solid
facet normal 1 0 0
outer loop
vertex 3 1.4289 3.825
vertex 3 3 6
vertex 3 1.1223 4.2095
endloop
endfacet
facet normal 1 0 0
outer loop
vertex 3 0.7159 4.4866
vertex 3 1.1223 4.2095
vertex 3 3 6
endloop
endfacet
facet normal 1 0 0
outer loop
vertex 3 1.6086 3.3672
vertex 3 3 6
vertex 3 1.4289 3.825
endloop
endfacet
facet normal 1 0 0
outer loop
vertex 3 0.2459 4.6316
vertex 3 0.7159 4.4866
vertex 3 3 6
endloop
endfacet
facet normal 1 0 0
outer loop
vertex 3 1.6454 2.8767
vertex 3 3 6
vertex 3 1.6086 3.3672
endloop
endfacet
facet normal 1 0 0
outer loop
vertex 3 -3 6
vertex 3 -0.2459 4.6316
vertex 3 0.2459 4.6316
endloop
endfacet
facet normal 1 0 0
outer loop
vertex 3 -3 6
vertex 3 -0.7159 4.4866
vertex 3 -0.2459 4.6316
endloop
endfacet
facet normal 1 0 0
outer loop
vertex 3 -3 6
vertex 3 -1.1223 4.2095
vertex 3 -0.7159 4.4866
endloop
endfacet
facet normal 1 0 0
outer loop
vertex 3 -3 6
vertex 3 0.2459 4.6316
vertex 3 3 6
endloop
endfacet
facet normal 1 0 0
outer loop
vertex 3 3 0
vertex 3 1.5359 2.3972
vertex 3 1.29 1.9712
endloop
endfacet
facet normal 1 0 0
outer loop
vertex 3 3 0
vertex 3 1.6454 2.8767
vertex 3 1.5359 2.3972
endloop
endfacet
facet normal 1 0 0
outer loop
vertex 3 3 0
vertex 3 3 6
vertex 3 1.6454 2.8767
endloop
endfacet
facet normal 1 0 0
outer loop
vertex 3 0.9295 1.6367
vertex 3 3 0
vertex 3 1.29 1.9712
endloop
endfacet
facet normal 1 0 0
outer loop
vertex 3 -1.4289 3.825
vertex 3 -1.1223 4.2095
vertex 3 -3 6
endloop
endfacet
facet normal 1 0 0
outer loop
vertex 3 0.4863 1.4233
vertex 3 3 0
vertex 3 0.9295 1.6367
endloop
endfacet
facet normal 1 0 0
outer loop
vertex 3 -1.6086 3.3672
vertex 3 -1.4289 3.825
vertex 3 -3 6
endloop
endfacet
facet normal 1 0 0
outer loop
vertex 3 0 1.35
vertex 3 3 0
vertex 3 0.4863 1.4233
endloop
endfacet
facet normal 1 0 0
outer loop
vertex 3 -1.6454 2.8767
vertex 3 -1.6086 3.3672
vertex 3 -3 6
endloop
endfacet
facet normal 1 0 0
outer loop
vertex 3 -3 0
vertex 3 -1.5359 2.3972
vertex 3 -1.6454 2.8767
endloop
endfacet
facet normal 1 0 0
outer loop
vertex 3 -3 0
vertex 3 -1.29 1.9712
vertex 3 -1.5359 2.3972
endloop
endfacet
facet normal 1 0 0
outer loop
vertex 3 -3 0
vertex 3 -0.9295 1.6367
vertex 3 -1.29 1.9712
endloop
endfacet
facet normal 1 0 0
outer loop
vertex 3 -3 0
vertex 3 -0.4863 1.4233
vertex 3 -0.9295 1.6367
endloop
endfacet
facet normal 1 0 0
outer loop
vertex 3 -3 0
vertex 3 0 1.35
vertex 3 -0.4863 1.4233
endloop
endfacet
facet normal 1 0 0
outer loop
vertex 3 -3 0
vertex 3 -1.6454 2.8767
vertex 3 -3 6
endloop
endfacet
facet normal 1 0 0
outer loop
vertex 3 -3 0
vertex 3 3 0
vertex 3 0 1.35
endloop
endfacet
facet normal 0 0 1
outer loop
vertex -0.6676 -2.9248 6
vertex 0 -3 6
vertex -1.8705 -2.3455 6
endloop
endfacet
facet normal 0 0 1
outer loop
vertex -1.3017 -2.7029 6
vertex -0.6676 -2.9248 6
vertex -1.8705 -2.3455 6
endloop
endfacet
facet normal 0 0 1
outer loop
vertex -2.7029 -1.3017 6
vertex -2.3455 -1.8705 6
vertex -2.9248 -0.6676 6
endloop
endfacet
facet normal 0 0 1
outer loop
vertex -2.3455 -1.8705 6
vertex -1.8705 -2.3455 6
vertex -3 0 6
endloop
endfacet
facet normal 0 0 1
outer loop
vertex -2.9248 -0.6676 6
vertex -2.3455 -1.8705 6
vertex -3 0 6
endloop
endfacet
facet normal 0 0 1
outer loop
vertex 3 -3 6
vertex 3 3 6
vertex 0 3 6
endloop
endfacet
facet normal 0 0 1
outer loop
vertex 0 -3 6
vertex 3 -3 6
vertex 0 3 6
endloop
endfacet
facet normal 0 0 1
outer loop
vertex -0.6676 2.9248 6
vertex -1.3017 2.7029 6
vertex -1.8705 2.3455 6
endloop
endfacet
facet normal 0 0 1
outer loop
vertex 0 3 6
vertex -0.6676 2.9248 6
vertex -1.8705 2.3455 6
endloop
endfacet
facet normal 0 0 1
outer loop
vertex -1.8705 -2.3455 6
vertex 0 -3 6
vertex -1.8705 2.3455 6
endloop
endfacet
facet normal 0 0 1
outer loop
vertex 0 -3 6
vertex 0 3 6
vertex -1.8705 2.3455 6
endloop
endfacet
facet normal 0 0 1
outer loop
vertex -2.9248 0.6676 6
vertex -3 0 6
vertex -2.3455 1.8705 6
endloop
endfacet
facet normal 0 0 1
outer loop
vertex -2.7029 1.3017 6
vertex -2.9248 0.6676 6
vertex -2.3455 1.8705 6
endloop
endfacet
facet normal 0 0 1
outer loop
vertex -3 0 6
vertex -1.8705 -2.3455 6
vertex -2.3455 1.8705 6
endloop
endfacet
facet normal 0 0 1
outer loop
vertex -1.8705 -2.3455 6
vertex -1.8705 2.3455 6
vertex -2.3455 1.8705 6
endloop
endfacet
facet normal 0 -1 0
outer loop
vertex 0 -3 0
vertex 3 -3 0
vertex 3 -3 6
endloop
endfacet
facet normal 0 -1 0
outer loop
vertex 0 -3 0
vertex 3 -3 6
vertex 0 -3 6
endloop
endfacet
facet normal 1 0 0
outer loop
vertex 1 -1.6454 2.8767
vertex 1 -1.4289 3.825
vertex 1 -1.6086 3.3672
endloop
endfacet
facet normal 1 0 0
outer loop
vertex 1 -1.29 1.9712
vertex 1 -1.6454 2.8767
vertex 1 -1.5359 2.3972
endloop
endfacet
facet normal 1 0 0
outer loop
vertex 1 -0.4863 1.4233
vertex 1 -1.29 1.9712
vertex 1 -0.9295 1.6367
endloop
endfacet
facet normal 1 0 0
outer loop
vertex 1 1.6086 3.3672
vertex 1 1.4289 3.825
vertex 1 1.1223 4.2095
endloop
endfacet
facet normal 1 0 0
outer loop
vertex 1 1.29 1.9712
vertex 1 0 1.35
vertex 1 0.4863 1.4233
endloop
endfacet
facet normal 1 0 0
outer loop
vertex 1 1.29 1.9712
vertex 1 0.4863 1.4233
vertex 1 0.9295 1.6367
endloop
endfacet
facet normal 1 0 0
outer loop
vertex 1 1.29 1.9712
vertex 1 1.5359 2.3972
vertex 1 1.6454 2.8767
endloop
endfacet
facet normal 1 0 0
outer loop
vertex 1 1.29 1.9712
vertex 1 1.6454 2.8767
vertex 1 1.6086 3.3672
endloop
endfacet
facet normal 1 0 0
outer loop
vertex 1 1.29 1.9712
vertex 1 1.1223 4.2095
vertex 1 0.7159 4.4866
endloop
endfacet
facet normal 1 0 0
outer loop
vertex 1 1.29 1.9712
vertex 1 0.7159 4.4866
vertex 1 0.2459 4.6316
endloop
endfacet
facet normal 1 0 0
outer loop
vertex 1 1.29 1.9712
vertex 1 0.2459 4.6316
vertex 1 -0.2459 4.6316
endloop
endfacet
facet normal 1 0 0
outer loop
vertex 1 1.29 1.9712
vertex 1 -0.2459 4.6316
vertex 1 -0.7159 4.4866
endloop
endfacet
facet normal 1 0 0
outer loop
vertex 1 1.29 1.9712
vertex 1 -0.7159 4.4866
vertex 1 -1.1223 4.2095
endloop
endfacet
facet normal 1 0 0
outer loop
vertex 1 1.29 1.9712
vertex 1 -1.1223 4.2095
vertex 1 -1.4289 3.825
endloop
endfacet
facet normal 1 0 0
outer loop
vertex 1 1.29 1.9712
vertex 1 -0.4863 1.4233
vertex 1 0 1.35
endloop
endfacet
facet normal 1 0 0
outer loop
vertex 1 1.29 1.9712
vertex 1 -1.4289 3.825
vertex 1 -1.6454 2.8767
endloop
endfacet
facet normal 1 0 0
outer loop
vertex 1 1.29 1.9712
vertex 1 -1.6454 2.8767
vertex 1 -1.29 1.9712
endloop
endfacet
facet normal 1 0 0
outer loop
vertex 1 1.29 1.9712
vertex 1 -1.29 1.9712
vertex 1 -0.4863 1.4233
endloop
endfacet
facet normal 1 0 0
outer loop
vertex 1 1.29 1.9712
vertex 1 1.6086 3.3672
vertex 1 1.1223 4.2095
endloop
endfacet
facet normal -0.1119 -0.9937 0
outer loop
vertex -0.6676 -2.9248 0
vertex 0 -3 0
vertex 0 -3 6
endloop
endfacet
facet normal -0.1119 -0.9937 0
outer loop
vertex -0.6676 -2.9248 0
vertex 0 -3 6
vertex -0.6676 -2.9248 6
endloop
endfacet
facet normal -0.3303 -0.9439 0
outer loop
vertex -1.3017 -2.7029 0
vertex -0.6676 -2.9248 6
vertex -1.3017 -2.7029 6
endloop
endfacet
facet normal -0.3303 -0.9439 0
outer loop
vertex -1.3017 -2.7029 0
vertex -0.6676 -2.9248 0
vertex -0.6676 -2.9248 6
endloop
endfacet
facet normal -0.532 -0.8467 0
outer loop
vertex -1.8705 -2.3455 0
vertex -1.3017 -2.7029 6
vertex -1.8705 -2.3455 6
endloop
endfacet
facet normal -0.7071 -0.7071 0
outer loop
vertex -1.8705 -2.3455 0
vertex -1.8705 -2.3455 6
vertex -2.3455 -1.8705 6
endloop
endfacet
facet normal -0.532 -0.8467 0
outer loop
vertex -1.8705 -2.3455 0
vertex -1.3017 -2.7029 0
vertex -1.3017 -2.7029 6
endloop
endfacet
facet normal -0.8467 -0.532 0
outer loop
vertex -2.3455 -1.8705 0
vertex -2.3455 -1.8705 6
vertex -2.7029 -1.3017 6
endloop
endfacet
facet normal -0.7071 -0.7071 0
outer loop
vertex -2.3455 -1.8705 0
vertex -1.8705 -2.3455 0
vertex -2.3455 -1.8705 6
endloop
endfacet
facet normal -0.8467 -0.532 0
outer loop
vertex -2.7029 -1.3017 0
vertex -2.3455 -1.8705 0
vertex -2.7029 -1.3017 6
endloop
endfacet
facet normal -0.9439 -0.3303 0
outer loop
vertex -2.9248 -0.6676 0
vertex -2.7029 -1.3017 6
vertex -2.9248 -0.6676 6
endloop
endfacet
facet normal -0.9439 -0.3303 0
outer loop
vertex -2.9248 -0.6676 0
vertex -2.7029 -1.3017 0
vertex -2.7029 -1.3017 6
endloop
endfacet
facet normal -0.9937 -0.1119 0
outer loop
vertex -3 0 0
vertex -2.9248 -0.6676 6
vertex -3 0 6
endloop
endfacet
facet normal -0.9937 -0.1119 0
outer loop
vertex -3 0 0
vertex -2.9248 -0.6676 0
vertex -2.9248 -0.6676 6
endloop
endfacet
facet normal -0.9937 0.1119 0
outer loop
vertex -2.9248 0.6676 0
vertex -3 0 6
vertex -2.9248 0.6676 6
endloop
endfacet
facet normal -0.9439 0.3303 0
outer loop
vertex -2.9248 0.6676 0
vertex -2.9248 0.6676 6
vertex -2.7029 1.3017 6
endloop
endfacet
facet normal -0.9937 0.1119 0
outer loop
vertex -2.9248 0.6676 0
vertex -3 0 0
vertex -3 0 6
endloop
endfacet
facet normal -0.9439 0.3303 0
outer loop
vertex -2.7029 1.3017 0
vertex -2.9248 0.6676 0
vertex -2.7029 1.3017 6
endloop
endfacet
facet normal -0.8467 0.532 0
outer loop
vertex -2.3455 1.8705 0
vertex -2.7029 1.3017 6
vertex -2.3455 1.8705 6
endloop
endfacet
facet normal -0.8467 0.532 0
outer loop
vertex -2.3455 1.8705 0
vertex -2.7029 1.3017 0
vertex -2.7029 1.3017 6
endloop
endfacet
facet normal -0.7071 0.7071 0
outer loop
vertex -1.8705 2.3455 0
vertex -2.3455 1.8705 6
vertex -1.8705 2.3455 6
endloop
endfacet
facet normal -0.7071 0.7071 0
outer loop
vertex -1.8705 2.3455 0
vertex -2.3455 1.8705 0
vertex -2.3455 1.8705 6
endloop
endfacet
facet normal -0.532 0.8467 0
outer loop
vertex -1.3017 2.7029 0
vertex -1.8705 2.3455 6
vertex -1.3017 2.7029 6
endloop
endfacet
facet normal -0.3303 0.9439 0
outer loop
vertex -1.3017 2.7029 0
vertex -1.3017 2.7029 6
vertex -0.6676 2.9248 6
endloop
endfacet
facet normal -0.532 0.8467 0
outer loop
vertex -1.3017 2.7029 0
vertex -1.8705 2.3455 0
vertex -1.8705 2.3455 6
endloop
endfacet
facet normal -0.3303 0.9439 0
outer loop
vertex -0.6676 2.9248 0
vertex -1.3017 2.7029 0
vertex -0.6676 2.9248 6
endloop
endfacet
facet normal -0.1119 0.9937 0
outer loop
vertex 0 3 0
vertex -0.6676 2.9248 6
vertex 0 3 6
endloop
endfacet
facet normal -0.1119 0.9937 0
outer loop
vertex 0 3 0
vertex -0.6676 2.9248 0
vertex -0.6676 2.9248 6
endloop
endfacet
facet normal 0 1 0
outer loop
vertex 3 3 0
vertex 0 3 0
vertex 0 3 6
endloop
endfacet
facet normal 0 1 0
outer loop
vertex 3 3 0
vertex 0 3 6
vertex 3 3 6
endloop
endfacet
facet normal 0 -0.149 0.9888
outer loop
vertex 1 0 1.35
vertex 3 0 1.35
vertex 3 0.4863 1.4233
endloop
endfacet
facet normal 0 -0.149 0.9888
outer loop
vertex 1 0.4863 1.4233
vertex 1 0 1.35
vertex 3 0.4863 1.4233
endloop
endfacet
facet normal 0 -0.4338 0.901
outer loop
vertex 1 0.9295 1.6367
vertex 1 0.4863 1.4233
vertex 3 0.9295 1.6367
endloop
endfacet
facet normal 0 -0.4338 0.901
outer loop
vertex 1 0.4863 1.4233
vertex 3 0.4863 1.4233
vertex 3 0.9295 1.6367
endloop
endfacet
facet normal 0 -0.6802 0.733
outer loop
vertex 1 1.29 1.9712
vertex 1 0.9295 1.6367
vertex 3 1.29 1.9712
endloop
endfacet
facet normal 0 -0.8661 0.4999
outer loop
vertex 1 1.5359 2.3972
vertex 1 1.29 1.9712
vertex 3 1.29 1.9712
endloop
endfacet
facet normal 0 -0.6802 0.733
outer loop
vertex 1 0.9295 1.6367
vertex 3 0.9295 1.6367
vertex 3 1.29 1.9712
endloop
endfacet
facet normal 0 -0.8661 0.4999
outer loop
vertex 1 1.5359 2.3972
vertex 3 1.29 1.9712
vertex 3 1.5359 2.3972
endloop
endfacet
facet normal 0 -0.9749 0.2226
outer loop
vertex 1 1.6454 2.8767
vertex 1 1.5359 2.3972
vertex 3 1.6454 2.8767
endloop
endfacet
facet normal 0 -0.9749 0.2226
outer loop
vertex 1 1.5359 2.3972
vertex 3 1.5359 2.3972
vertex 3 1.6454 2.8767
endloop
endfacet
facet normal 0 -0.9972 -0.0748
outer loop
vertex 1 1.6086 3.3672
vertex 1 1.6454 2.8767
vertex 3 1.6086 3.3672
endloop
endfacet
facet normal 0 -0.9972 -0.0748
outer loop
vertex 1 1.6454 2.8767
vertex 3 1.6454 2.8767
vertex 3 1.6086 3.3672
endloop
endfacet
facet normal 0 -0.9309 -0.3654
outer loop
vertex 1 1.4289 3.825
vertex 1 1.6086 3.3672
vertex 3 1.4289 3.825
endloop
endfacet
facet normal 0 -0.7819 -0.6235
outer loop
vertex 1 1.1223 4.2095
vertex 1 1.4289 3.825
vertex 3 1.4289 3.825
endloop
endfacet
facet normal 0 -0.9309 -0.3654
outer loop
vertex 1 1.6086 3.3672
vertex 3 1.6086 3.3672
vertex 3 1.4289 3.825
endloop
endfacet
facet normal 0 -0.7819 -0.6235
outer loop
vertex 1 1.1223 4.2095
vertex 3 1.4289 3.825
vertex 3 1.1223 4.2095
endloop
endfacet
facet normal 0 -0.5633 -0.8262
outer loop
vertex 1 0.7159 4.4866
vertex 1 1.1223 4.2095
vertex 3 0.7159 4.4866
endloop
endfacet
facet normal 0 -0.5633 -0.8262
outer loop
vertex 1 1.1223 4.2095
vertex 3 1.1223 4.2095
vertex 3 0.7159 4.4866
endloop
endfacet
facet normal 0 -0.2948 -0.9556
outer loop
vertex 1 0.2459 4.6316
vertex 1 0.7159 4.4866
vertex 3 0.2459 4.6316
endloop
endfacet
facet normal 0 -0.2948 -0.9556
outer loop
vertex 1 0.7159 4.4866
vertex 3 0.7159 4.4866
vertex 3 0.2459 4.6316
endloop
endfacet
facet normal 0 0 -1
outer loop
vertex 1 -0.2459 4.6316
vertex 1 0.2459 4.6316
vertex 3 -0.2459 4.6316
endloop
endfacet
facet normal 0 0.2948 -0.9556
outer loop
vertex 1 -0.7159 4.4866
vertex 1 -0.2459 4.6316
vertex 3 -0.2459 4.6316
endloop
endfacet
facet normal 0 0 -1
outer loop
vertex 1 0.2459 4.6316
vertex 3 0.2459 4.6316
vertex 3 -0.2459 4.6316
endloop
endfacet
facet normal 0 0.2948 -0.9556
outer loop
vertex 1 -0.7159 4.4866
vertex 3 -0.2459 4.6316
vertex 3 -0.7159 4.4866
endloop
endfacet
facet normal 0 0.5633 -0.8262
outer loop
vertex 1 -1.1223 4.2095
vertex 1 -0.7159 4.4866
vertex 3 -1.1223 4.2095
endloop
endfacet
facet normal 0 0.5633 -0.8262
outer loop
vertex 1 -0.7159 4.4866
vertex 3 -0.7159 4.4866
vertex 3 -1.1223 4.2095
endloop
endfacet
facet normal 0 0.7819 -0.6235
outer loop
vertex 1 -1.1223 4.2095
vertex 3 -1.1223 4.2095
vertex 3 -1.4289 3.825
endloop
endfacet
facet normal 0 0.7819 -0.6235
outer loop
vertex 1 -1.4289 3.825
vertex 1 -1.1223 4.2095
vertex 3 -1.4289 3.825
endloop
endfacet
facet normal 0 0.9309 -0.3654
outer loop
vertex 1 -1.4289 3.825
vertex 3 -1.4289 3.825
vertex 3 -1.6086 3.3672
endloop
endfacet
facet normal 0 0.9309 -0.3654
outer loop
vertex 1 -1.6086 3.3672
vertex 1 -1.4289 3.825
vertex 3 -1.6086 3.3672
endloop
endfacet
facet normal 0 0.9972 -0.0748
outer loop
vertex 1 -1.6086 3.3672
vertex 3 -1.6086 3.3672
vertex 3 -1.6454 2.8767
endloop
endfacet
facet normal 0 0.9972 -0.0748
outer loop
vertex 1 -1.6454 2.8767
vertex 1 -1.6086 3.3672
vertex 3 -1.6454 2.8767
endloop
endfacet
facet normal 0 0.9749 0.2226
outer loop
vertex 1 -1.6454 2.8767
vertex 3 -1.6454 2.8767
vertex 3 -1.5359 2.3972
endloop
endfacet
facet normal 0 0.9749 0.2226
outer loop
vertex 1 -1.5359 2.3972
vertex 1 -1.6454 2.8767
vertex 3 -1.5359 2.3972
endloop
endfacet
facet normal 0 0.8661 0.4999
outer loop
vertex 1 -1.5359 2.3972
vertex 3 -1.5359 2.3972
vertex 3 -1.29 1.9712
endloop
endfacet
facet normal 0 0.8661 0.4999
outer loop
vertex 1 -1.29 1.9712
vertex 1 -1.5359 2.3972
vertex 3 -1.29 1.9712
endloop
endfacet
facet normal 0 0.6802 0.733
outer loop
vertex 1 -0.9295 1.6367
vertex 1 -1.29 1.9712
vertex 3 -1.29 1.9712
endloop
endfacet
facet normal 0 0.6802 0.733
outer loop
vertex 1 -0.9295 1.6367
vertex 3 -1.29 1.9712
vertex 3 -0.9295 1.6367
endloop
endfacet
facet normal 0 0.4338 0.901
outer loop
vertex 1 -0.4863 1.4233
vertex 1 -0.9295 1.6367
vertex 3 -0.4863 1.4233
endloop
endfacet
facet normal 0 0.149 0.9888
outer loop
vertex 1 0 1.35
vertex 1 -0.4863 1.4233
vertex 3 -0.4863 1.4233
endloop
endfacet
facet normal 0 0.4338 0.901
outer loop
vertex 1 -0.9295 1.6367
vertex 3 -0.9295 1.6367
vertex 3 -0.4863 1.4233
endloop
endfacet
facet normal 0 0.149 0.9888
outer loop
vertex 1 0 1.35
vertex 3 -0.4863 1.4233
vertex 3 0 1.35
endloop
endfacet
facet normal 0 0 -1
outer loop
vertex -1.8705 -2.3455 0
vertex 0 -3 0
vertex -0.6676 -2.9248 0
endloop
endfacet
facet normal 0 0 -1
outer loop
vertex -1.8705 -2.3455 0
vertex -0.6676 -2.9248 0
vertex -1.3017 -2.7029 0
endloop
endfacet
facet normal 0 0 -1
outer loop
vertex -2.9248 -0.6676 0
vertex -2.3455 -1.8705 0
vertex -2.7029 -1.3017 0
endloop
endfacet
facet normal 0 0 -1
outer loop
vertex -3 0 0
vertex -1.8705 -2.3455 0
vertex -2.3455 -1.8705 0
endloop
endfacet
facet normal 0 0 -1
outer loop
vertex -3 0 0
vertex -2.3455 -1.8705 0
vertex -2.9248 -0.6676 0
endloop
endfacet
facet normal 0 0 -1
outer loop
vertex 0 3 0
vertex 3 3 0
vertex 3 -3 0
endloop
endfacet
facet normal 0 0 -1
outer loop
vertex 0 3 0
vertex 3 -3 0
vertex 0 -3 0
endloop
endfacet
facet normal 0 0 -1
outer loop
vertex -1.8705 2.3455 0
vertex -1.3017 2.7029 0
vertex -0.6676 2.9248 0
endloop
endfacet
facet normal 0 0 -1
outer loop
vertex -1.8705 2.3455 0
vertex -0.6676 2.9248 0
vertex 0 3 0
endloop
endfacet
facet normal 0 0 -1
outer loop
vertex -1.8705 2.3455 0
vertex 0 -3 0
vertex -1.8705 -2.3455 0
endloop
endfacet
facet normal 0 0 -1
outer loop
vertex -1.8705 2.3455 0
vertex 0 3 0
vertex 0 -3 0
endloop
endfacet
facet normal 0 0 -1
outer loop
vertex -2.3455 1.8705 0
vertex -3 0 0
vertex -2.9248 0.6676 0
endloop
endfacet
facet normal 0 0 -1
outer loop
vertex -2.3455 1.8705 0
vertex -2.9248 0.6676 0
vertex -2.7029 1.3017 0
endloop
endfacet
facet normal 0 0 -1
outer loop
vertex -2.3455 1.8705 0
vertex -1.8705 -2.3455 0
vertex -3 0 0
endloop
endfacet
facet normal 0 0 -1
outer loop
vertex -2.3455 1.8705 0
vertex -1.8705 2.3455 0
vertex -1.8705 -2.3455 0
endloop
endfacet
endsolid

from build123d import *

# Parameters (mm, degrees)
RESSALTO_EXTRUS_O1_DEPTH = 6
ESBO_O3_R                = 1.65
CORTE_EXTRUS_O1_DEPTH    = 2


with BuildPart() as part:
    # Esboço1 → Ressalto-extrusão1 (new body)
    with BuildSketch(Plane.XY):
        with BuildLine():
            Line((0, 3), (3, 3))
            Line((3, 3), (3, -3))
            Line((3, -3), (0, -3))
            ThreePointArc((0, -3), (-3, 0), (0, 3))
        make_face()
    extrude(amount=RESSALTO_EXTRUS_O1_DEPTH)

    # Esboço3 → Corte-extrusão1 (cut)
    with BuildSketch(Plane(origin=(3, 0, 0), x_dir=(0, 0, -1), z_dir=(1, 0, 0))):
        with Locations((-3, 0)):
            Circle(ESBO_O3_R)
    extrude(amount=-CORTE_EXTRUS_O1_DEPTH, mode=Mode.SUBTRACT)


solid = part.part
